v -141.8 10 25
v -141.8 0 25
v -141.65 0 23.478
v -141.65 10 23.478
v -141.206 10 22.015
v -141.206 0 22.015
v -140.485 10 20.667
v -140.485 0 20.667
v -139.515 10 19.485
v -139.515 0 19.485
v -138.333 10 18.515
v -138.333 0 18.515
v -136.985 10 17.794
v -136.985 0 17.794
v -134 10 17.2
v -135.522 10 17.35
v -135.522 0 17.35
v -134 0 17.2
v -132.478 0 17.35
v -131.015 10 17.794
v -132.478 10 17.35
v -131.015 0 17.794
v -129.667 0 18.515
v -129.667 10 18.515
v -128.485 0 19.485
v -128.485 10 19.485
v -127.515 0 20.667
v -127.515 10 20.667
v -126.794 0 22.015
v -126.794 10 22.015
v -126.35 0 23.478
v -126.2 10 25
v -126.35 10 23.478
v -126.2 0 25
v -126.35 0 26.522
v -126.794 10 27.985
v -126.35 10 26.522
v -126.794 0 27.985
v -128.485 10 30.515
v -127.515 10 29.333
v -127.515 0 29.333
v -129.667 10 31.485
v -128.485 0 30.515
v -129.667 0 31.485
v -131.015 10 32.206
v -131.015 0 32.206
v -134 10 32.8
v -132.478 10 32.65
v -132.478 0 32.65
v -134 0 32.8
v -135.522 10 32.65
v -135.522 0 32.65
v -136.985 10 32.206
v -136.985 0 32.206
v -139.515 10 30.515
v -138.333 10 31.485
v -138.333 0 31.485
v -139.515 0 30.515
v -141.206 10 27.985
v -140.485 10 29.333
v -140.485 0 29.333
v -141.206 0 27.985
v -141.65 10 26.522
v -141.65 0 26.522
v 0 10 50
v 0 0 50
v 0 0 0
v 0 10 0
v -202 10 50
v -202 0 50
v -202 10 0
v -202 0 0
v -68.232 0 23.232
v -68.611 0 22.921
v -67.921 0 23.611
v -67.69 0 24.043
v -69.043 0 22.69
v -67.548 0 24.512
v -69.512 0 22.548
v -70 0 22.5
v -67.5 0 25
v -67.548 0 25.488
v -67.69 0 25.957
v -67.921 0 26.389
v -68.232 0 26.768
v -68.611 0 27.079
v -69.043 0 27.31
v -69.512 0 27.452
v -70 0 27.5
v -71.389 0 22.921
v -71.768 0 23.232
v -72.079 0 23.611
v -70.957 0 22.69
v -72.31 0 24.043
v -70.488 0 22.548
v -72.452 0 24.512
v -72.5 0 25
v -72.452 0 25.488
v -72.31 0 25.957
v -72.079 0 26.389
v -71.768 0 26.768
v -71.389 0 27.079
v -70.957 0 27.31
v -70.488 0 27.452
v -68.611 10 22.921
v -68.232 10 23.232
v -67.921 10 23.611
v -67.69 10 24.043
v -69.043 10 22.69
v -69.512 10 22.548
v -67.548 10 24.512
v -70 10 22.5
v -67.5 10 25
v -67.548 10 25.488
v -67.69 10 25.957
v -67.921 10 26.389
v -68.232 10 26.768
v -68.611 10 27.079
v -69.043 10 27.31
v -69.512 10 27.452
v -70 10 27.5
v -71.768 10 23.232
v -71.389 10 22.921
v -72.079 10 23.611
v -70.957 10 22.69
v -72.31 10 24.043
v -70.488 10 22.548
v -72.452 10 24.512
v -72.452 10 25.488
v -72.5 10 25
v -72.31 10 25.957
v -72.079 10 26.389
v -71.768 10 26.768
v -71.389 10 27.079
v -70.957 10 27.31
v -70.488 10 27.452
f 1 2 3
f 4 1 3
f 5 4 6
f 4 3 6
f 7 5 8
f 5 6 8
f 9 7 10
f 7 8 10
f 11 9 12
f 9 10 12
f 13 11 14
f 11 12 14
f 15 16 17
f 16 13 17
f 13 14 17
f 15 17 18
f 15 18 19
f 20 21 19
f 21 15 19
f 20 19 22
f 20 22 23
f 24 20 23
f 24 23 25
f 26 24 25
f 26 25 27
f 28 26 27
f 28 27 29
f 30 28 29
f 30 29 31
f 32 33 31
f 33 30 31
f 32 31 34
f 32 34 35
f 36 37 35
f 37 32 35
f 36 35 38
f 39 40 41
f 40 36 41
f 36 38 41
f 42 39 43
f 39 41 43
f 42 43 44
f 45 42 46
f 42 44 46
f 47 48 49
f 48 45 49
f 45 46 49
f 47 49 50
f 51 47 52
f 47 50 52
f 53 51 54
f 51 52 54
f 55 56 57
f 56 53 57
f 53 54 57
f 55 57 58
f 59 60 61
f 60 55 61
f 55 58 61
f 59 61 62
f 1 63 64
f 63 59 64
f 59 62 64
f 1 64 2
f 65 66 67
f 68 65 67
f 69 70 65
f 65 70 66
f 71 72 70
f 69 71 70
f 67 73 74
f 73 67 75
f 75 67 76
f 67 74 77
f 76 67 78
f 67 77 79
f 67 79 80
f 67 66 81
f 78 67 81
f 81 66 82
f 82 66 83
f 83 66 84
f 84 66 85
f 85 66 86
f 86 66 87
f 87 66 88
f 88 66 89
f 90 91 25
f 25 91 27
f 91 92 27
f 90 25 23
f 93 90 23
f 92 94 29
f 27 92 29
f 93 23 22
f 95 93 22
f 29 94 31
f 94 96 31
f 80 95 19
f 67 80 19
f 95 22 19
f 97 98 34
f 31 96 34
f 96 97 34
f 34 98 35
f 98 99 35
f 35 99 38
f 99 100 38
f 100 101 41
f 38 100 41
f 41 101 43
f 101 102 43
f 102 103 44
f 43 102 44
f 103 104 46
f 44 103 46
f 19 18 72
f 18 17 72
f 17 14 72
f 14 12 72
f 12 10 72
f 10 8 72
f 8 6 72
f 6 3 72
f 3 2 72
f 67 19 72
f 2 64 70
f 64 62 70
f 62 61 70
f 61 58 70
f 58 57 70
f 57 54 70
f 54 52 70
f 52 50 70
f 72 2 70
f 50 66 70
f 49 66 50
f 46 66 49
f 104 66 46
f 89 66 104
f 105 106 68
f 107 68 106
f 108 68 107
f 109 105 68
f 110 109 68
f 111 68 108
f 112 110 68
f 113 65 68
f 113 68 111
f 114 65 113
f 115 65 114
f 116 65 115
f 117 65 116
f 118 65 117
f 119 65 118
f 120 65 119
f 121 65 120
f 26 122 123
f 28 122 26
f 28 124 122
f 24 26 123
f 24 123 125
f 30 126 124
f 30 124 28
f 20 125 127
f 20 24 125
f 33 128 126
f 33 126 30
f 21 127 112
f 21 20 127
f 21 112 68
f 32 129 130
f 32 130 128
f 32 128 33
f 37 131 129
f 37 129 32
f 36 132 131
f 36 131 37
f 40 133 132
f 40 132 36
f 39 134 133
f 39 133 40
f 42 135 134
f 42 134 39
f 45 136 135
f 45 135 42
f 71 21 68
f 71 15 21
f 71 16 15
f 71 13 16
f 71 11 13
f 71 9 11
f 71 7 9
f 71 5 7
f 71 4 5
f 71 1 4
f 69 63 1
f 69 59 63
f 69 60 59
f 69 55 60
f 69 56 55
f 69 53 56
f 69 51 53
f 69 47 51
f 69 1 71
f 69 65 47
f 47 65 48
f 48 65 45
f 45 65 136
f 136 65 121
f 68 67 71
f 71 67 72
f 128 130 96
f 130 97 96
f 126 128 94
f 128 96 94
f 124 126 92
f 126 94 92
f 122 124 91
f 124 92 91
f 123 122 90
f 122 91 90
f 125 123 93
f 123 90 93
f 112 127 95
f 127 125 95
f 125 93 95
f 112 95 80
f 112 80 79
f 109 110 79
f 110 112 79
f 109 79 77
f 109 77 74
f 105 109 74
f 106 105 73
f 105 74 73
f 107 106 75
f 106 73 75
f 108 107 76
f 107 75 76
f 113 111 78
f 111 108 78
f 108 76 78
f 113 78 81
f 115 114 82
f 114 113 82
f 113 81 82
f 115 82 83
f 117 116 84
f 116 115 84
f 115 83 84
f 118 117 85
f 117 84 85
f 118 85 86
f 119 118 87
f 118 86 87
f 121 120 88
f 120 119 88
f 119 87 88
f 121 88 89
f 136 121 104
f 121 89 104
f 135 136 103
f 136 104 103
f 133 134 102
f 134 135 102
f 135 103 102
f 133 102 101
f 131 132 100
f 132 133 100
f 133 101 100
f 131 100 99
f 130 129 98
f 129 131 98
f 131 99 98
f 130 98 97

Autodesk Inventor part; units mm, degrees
ref_plane "YZ Plane" through (0, 0, 0) normal (1, 0, 0) x (0, 1, 0)
ref_plane "XZ Plane" through (0, 0, 0) normal (0, 1, 0) x (-1, 0, 0)
ref_plane "XY Plane" through (0, 0, 0) normal (0, 0, 1) x (1, 0, 0)
sketch "Sketch1" plane through (0, 0, 0) normal (0, 1, 0) x (-1, 0, 0)
  line L0 (0, 0) -> (202, 0)
  line L1 (202, 0) -> (202, 50)
  line L2 (202, 50) -> (0, 50)
  line L3 (0, 50) -> (0, 0)
  circle A0 centre (70, 25) radius 2.5
  circle A1 centre (134, 25) radius 7.8
extrude "Extrusion1" add sketch "Sketch1" along normal blind 10
properties part number "column" material "Wood (Oak)"
